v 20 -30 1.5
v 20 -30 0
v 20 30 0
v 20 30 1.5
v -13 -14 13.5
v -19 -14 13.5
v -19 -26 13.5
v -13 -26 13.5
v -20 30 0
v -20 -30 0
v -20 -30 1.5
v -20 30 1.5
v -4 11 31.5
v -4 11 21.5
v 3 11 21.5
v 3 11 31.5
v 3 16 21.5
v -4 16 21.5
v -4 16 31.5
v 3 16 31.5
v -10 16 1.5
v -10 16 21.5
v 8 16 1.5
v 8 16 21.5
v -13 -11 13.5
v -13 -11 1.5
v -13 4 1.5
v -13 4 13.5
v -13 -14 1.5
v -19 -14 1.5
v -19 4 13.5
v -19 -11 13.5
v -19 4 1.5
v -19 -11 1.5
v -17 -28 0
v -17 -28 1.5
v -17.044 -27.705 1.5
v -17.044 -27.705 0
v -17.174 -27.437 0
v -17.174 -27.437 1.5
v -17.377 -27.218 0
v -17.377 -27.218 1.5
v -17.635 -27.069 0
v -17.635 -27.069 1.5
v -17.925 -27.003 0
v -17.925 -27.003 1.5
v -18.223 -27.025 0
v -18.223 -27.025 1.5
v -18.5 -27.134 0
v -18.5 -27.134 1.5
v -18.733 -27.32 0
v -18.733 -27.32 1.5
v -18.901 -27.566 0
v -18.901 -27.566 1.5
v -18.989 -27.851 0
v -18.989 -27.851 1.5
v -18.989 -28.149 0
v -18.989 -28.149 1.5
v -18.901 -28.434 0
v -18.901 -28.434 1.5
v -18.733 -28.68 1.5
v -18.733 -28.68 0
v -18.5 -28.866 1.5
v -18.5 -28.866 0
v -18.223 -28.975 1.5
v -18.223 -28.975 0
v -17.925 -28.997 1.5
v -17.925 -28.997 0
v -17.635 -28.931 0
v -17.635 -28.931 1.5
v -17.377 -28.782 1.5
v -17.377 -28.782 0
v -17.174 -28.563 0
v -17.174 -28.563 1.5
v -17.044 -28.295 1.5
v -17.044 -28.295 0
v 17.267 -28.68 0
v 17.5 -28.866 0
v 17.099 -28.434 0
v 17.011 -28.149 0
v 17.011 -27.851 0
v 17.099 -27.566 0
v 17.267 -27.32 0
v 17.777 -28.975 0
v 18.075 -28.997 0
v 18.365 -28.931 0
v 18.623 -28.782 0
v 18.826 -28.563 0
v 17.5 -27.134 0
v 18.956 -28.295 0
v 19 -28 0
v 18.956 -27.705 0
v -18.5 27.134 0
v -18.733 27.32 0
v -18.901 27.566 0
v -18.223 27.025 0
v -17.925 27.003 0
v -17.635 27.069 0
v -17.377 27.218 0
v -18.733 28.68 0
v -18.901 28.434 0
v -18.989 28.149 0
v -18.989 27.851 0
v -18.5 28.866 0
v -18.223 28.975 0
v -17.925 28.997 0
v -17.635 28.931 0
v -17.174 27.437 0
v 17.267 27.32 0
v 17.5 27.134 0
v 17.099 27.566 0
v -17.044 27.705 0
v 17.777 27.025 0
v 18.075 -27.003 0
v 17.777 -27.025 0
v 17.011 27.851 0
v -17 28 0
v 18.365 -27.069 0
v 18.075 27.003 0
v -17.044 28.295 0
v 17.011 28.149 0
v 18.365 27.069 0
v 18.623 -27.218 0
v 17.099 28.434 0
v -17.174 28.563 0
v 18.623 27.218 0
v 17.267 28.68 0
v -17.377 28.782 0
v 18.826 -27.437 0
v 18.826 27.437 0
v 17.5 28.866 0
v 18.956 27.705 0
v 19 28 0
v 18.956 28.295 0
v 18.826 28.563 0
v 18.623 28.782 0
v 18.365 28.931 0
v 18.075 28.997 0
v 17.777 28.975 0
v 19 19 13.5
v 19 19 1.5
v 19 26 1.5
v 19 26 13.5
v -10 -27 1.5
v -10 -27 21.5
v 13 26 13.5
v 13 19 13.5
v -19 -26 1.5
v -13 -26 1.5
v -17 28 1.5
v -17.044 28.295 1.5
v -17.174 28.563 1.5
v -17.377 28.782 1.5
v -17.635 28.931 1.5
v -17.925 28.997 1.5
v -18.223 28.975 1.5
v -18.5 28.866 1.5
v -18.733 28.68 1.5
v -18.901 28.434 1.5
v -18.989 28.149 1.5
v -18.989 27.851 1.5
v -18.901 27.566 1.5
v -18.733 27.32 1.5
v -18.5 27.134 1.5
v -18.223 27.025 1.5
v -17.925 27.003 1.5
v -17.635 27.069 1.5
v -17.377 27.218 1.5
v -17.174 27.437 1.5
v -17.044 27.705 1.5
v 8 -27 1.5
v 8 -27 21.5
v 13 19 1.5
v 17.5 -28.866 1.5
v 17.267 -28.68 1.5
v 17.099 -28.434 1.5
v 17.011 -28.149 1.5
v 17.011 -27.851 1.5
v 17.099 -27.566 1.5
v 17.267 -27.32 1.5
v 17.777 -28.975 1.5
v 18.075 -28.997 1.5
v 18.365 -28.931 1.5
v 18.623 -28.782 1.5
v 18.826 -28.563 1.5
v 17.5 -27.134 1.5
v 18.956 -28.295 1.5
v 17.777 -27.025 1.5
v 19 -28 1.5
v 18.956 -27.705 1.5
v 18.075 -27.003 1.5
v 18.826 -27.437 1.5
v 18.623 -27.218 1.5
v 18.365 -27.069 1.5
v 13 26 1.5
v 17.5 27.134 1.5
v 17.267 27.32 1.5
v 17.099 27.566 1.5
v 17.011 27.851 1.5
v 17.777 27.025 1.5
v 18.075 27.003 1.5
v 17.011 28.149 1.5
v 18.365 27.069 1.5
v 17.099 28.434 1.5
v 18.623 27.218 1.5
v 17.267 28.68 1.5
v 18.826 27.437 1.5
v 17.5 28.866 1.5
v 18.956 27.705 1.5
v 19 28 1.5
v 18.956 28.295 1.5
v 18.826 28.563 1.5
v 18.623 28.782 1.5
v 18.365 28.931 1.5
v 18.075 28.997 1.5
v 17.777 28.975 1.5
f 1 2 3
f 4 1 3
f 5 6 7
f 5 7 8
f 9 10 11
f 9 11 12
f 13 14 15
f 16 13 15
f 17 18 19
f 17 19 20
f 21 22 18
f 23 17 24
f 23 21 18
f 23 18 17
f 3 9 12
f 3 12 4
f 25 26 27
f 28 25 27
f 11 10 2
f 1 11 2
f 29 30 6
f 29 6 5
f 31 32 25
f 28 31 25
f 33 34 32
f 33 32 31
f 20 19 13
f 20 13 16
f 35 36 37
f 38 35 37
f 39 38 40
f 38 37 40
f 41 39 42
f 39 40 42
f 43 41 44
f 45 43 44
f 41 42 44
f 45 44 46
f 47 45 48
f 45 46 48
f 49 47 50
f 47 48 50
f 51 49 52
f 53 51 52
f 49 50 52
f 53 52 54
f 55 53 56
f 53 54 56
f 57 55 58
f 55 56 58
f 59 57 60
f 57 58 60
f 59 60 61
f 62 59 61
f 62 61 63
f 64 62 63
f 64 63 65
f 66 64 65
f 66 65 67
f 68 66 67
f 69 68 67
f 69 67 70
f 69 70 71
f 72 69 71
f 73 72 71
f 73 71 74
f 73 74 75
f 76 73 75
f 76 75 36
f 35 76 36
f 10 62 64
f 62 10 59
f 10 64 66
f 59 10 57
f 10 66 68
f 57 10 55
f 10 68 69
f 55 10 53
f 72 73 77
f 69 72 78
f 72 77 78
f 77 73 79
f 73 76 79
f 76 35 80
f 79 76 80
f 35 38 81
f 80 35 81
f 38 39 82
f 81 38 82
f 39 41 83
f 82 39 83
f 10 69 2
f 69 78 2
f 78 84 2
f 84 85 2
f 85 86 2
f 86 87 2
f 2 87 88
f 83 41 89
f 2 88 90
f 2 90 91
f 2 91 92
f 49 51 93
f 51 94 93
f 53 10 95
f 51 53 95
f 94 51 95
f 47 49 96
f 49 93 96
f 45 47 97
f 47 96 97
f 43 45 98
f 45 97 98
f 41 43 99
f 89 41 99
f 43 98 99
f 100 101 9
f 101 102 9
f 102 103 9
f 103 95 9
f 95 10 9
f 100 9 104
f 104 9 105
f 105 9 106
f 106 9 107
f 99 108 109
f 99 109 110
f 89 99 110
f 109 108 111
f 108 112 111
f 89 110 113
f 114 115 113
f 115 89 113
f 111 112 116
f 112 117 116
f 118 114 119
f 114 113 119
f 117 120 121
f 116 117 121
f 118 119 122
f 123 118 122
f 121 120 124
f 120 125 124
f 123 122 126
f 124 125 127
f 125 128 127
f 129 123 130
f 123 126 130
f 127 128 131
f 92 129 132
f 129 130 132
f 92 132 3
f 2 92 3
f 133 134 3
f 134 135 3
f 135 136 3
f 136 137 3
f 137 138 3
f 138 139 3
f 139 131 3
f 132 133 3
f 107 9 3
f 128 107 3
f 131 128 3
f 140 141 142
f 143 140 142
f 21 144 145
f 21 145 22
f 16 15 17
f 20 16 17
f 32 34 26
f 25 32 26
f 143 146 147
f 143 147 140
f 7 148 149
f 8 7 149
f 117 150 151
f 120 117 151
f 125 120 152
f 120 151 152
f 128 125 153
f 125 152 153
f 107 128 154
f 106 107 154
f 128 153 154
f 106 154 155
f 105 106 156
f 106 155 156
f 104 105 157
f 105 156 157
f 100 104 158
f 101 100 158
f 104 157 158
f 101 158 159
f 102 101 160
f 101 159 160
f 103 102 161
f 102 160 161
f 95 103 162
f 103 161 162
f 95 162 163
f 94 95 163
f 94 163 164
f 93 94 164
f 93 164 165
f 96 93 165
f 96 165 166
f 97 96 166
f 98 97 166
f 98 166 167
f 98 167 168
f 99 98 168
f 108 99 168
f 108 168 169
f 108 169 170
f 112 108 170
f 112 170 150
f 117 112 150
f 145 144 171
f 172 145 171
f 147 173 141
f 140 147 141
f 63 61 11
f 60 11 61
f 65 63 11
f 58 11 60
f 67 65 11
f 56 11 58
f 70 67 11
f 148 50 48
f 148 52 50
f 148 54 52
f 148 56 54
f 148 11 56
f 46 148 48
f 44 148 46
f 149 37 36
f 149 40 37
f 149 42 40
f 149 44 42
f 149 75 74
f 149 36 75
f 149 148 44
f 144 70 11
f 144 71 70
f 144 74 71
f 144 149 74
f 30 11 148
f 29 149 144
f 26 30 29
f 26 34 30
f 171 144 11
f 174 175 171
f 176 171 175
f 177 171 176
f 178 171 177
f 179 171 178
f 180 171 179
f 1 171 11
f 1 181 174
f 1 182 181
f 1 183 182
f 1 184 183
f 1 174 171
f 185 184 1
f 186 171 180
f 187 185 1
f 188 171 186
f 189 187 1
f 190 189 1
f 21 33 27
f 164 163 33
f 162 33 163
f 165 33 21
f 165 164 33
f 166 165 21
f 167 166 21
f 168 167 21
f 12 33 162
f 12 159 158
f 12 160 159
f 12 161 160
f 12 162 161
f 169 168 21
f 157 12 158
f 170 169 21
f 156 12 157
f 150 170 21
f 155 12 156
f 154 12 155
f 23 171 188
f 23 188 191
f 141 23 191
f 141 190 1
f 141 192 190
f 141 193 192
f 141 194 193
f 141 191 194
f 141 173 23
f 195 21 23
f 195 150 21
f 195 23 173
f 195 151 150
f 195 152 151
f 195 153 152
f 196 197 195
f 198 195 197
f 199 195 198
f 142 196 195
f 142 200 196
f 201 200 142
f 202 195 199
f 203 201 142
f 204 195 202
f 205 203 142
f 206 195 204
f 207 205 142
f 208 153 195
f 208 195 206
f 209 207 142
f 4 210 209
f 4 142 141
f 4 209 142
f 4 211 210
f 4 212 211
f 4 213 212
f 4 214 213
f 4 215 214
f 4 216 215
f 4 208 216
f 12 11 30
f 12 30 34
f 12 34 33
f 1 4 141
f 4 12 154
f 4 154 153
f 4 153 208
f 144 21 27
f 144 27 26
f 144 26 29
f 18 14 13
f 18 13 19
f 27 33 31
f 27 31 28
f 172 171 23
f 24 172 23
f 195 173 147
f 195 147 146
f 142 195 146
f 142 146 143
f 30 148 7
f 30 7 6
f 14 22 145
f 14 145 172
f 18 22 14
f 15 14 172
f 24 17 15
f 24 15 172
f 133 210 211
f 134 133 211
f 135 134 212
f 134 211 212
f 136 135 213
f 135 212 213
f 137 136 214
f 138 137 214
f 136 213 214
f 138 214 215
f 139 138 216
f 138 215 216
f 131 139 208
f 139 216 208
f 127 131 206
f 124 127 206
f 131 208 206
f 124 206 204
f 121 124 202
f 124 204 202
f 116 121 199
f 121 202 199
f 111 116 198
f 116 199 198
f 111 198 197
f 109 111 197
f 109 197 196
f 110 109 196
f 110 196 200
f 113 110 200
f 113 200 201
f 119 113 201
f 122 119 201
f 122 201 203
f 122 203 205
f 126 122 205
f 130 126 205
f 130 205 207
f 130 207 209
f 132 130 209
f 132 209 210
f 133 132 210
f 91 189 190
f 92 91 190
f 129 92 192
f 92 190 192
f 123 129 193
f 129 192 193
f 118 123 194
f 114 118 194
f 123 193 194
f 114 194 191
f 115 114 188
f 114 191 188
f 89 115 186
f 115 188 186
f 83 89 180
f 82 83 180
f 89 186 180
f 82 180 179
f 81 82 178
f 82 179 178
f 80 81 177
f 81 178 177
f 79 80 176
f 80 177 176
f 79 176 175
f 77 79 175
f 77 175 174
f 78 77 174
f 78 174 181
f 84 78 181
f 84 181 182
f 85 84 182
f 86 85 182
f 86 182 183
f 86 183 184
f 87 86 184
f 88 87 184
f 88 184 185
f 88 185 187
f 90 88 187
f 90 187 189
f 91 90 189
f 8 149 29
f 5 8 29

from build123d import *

# Parameters (mm, degrees)
SKETCH_W      = 40
SKETCH_H      = 60
PAD_DEPTH     = 1.5
SKETCH001_R   = 1
POCKET_DEPTH  = 1.501
SKETCH002_W   = 18
SKETCH002_H   = 43
PAD001_DEPTH  = 20
SKETCH003_W   = 7
SKETCH003_H   = 5
PAD002_DEPTH  = 10
SKETCH004_W   = 6
SKETCH004_H   = 12
SKETCH004_H_2 = 15
SKETCH004_H_3 = 7
PAD003_DEPTH  = 12


with BuildPart() as part:
    # Sketch → Pad (new body)
    with BuildSketch(Plane.XY):
        Rectangle(SKETCH_W, SKETCH_H)
    extrude(amount=PAD_DEPTH)

    # Sketch001 (on Face6 of Pad) → Pocket (cut, through all)
    with BuildSketch(Plane.XY.offset(1.5)):
        with Locations((-18, 28)):
            Circle(SKETCH001_R)
        with Locations((18, 28)):
            Circle(SKETCH001_R)
        with Locations((-18, -28)):
            Circle(SKETCH001_R)
        with Locations((18, -28)):
            Circle(SKETCH001_R)
    extrude(amount=-POCKET_DEPTH, mode=Mode.SUBTRACT)

    # Sketch002 (on Face5 of Pocket) → Pad001 (join)
    with BuildSketch(Plane.XY.offset(1.5)):
        with Locations((-1, -5.5)):
            Rectangle(SKETCH002_W, SKETCH002_H)
    extrude(amount=PAD001_DEPTH)

    # Sketch003 (on Face15 of Pad001) → Pad002 (join)
    with BuildSketch(Plane.XY.offset(21.5)):
        with Locations((-0.5, 13.5)):
            Rectangle(SKETCH003_W, SKETCH003_H)
    extrude(amount=PAD002_DEPTH)

    # Sketch004 (on Face5 of Pad002) → Pad003 (join)
    with BuildSketch(Plane.XY.offset(1.5)):
        with Locations((-16, -20)):
            Rectangle(SKETCH004_W, SKETCH004_H)
        with Locations((-16, -3.5)):
            Rectangle(SKETCH004_W, SKETCH004_H_2)
        with Locations((16, 22.5)):
            Rectangle(SKETCH004_W, SKETCH004_H_3)
    extrude(amount=PAD003_DEPTH)


solid = part.part
